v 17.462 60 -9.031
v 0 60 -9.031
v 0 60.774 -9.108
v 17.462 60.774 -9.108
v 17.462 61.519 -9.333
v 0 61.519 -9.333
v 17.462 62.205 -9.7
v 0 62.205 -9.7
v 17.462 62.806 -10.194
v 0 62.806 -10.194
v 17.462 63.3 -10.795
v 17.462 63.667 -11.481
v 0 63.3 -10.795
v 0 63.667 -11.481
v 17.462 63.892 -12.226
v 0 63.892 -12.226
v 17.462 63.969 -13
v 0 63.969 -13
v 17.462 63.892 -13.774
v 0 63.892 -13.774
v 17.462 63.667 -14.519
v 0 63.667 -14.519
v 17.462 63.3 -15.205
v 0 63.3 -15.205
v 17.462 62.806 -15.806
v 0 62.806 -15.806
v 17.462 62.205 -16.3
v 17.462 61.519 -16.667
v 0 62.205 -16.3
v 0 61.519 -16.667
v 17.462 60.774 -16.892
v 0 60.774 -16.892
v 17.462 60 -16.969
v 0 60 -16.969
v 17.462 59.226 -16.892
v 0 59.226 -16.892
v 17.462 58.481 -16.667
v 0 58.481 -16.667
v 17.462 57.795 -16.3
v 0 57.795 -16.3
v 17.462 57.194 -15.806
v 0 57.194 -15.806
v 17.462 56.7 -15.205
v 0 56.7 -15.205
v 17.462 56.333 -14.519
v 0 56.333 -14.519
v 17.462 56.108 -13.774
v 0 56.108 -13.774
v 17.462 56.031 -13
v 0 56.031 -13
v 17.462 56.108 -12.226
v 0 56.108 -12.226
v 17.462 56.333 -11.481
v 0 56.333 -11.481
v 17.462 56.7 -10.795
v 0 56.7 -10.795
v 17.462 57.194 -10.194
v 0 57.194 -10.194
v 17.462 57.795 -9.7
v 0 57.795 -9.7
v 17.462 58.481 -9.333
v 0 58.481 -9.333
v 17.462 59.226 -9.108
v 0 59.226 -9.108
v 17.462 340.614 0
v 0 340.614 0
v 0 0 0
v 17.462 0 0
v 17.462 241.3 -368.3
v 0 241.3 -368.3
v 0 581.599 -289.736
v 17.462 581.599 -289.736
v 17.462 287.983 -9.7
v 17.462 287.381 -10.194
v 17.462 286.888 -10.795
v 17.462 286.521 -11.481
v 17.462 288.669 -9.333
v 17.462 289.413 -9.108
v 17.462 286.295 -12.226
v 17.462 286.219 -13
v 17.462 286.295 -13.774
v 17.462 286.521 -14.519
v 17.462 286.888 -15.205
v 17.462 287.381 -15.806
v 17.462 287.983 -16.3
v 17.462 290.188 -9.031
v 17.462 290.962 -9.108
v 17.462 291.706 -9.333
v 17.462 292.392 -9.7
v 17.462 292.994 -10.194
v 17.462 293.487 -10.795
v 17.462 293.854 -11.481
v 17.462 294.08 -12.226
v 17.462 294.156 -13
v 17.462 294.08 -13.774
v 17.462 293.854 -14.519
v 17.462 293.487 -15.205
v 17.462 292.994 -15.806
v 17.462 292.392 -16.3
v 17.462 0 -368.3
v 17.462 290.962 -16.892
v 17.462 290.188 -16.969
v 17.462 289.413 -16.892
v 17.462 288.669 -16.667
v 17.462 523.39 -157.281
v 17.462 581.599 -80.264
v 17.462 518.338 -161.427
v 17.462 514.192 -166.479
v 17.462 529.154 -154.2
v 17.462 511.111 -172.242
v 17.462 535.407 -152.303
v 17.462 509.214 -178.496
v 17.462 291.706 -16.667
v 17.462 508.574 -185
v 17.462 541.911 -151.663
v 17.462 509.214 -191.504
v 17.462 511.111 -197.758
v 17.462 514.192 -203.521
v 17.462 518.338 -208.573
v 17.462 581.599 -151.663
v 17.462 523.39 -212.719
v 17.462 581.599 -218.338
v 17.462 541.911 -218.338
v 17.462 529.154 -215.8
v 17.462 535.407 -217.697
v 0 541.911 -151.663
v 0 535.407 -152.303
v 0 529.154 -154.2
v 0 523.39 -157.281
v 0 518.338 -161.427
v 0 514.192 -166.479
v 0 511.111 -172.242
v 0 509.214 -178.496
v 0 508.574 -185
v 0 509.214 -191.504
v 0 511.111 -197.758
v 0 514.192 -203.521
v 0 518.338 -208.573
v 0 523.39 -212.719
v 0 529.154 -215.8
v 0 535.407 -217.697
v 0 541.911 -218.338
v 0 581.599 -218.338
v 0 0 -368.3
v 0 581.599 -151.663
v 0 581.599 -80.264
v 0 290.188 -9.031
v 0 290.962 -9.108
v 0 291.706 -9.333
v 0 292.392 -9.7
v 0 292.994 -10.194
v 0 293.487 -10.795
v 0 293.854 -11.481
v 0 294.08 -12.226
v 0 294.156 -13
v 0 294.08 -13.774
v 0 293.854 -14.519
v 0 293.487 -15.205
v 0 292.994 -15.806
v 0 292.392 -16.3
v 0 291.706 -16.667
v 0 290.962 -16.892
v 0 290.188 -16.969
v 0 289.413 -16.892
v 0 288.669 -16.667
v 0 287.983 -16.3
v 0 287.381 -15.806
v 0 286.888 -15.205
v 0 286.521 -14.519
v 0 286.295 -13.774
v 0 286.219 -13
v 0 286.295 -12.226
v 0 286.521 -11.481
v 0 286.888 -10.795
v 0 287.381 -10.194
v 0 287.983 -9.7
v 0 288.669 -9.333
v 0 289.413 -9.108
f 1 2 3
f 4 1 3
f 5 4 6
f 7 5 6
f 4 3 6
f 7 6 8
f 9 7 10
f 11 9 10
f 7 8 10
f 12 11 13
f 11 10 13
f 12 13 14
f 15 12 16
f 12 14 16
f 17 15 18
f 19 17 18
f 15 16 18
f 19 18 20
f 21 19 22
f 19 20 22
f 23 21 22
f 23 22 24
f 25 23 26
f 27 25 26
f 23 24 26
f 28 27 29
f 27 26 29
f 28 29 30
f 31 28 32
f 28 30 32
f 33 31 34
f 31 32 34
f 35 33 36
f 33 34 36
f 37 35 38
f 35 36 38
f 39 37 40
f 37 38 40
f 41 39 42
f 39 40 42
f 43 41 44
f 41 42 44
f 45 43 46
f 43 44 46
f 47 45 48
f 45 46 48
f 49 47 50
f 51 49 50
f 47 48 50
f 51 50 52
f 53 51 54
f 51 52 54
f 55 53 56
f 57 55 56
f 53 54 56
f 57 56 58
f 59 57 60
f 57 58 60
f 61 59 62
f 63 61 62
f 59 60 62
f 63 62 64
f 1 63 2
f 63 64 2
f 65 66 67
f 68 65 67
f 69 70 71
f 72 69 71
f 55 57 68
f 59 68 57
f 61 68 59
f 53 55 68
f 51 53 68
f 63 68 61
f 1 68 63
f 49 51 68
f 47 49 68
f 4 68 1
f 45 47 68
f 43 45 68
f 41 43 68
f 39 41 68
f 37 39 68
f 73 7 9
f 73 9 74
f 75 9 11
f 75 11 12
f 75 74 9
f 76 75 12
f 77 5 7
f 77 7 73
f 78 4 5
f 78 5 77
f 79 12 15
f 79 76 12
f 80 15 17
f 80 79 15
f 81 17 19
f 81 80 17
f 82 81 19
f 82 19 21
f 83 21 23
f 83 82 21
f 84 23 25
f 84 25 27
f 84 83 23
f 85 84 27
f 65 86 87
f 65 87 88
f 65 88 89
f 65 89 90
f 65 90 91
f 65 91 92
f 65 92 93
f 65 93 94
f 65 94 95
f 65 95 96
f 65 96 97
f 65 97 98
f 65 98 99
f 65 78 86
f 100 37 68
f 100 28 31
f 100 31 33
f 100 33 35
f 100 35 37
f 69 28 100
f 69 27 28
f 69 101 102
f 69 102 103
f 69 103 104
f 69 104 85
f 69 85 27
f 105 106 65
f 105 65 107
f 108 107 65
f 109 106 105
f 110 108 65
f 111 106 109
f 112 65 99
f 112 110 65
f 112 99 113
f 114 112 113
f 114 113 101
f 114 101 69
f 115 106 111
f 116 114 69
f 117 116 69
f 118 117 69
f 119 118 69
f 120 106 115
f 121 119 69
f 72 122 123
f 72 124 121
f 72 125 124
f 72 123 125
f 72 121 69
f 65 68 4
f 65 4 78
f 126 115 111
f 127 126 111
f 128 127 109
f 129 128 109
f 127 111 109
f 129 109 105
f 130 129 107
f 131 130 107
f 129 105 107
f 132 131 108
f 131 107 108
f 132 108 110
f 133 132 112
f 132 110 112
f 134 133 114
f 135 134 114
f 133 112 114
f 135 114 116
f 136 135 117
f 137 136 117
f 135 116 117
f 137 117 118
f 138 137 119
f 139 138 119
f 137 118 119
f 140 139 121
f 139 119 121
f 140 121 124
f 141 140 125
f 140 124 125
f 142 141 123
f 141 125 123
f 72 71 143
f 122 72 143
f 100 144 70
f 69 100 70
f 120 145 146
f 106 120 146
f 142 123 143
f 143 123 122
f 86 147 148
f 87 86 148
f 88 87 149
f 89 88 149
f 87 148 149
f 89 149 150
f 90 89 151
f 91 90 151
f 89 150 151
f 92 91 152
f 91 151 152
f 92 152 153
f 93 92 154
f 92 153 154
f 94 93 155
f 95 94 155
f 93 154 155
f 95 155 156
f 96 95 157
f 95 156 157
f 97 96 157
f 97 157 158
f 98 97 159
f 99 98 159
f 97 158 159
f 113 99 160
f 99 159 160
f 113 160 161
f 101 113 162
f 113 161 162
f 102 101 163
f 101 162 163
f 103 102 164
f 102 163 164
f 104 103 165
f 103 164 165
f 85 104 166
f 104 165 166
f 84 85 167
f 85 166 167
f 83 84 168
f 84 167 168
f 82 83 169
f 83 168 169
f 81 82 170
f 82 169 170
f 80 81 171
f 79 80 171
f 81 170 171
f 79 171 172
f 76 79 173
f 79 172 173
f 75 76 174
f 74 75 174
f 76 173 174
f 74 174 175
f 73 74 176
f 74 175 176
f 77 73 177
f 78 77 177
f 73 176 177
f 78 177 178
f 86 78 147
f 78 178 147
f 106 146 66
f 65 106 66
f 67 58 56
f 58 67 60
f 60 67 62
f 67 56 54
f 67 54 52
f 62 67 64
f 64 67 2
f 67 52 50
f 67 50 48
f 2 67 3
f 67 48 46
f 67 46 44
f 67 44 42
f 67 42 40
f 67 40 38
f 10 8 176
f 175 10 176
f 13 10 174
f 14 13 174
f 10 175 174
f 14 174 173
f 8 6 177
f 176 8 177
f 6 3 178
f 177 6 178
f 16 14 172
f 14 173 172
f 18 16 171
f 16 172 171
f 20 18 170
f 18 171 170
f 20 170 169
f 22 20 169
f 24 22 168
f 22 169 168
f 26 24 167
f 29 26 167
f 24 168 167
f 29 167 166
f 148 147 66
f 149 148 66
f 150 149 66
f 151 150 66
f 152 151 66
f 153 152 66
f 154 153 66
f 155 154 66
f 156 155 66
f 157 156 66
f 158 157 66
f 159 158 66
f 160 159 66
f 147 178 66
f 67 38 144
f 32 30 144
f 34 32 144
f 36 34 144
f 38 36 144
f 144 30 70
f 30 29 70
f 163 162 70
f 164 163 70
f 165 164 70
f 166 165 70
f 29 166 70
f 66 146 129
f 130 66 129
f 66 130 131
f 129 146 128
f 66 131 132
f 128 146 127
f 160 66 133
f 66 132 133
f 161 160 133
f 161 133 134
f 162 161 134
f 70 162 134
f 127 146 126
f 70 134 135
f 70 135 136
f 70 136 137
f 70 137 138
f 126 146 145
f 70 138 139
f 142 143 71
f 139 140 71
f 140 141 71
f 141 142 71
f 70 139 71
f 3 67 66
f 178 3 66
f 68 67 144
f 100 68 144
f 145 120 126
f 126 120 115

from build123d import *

# Parameters (mm, degrees)
BOSS_EXTRUDE1_DEPTH = 17.4625
CUT_EXTRUDE1_DEPTH  = 17.4625
SKETCH2_R           = 3.96875
CUT_EXTRUDE2_DEPTH  = 17.4625


with BuildPart() as part:
    # Sketch1 → Boss-Extrude1 (new body)
    with BuildSketch(Plane(origin=(0, 0, 0), x_dir=(0, 0, -1), z_dir=(1, 0, 0))):
        Polygon((0, 0), (368.3, 0), (368.3, 241.3), (289.73584427, 581.598745126), (80.26426737, 581.598745126), (0, 340.614), align=None)
    extrude(amount=BOSS_EXTRUDE1_DEPTH)

    # RockerBoxCutout → Cut-Extrude1 (cut)
    with BuildSketch(Plane(origin=(17.4625, 0, 0), x_dir=(0, 0, -1), z_dir=(1, 0, 0))):
        with BuildLine():
            ThreePointArc((218.33755582, 541.911245126), (185.00005582, 575.248745126), (151.66255582, 541.911245126))
            Line((151.66255582, 541.911245126), (218.33755582, 541.911245126))
        make_face()
        with BuildLine():
            Line((218.33755582, 541.911245126), (151.66255582, 541.911245126))
            ThreePointArc((151.66255582, 541.911245126), (185.00005582, 508.573745126), (218.33755582, 541.911245126))
        make_face()
        with BuildLine():
            Line((151.66255582, 581.598745126), (151.66255582, 541.911245126))
            ThreePointArc((151.66255582, 541.911245126), (185.00005582, 575.248745126), (218.33755582, 541.911245126))
            Line((218.33755582, 541.911245126), (218.33755582, 581.598745126))
            Line((218.33755582, 581.598745126), (151.66255582, 581.598745126))
        make_face()
    extrude(amount=-CUT_EXTRUDE1_DEPTH, mode=Mode.SUBTRACT)

    # Sketch2 → Cut-Extrude2 (cut)
    with BuildSketch(Plane.ZY):
        with Locations((-13, 60)):
            Circle(SKETCH2_R)
        with Locations((-13, 290.1875)):
            Circle(SKETCH2_R)
    extrude(amount=-CUT_EXTRUDE2_DEPTH, mode=Mode.SUBTRACT)


solid = part.part
